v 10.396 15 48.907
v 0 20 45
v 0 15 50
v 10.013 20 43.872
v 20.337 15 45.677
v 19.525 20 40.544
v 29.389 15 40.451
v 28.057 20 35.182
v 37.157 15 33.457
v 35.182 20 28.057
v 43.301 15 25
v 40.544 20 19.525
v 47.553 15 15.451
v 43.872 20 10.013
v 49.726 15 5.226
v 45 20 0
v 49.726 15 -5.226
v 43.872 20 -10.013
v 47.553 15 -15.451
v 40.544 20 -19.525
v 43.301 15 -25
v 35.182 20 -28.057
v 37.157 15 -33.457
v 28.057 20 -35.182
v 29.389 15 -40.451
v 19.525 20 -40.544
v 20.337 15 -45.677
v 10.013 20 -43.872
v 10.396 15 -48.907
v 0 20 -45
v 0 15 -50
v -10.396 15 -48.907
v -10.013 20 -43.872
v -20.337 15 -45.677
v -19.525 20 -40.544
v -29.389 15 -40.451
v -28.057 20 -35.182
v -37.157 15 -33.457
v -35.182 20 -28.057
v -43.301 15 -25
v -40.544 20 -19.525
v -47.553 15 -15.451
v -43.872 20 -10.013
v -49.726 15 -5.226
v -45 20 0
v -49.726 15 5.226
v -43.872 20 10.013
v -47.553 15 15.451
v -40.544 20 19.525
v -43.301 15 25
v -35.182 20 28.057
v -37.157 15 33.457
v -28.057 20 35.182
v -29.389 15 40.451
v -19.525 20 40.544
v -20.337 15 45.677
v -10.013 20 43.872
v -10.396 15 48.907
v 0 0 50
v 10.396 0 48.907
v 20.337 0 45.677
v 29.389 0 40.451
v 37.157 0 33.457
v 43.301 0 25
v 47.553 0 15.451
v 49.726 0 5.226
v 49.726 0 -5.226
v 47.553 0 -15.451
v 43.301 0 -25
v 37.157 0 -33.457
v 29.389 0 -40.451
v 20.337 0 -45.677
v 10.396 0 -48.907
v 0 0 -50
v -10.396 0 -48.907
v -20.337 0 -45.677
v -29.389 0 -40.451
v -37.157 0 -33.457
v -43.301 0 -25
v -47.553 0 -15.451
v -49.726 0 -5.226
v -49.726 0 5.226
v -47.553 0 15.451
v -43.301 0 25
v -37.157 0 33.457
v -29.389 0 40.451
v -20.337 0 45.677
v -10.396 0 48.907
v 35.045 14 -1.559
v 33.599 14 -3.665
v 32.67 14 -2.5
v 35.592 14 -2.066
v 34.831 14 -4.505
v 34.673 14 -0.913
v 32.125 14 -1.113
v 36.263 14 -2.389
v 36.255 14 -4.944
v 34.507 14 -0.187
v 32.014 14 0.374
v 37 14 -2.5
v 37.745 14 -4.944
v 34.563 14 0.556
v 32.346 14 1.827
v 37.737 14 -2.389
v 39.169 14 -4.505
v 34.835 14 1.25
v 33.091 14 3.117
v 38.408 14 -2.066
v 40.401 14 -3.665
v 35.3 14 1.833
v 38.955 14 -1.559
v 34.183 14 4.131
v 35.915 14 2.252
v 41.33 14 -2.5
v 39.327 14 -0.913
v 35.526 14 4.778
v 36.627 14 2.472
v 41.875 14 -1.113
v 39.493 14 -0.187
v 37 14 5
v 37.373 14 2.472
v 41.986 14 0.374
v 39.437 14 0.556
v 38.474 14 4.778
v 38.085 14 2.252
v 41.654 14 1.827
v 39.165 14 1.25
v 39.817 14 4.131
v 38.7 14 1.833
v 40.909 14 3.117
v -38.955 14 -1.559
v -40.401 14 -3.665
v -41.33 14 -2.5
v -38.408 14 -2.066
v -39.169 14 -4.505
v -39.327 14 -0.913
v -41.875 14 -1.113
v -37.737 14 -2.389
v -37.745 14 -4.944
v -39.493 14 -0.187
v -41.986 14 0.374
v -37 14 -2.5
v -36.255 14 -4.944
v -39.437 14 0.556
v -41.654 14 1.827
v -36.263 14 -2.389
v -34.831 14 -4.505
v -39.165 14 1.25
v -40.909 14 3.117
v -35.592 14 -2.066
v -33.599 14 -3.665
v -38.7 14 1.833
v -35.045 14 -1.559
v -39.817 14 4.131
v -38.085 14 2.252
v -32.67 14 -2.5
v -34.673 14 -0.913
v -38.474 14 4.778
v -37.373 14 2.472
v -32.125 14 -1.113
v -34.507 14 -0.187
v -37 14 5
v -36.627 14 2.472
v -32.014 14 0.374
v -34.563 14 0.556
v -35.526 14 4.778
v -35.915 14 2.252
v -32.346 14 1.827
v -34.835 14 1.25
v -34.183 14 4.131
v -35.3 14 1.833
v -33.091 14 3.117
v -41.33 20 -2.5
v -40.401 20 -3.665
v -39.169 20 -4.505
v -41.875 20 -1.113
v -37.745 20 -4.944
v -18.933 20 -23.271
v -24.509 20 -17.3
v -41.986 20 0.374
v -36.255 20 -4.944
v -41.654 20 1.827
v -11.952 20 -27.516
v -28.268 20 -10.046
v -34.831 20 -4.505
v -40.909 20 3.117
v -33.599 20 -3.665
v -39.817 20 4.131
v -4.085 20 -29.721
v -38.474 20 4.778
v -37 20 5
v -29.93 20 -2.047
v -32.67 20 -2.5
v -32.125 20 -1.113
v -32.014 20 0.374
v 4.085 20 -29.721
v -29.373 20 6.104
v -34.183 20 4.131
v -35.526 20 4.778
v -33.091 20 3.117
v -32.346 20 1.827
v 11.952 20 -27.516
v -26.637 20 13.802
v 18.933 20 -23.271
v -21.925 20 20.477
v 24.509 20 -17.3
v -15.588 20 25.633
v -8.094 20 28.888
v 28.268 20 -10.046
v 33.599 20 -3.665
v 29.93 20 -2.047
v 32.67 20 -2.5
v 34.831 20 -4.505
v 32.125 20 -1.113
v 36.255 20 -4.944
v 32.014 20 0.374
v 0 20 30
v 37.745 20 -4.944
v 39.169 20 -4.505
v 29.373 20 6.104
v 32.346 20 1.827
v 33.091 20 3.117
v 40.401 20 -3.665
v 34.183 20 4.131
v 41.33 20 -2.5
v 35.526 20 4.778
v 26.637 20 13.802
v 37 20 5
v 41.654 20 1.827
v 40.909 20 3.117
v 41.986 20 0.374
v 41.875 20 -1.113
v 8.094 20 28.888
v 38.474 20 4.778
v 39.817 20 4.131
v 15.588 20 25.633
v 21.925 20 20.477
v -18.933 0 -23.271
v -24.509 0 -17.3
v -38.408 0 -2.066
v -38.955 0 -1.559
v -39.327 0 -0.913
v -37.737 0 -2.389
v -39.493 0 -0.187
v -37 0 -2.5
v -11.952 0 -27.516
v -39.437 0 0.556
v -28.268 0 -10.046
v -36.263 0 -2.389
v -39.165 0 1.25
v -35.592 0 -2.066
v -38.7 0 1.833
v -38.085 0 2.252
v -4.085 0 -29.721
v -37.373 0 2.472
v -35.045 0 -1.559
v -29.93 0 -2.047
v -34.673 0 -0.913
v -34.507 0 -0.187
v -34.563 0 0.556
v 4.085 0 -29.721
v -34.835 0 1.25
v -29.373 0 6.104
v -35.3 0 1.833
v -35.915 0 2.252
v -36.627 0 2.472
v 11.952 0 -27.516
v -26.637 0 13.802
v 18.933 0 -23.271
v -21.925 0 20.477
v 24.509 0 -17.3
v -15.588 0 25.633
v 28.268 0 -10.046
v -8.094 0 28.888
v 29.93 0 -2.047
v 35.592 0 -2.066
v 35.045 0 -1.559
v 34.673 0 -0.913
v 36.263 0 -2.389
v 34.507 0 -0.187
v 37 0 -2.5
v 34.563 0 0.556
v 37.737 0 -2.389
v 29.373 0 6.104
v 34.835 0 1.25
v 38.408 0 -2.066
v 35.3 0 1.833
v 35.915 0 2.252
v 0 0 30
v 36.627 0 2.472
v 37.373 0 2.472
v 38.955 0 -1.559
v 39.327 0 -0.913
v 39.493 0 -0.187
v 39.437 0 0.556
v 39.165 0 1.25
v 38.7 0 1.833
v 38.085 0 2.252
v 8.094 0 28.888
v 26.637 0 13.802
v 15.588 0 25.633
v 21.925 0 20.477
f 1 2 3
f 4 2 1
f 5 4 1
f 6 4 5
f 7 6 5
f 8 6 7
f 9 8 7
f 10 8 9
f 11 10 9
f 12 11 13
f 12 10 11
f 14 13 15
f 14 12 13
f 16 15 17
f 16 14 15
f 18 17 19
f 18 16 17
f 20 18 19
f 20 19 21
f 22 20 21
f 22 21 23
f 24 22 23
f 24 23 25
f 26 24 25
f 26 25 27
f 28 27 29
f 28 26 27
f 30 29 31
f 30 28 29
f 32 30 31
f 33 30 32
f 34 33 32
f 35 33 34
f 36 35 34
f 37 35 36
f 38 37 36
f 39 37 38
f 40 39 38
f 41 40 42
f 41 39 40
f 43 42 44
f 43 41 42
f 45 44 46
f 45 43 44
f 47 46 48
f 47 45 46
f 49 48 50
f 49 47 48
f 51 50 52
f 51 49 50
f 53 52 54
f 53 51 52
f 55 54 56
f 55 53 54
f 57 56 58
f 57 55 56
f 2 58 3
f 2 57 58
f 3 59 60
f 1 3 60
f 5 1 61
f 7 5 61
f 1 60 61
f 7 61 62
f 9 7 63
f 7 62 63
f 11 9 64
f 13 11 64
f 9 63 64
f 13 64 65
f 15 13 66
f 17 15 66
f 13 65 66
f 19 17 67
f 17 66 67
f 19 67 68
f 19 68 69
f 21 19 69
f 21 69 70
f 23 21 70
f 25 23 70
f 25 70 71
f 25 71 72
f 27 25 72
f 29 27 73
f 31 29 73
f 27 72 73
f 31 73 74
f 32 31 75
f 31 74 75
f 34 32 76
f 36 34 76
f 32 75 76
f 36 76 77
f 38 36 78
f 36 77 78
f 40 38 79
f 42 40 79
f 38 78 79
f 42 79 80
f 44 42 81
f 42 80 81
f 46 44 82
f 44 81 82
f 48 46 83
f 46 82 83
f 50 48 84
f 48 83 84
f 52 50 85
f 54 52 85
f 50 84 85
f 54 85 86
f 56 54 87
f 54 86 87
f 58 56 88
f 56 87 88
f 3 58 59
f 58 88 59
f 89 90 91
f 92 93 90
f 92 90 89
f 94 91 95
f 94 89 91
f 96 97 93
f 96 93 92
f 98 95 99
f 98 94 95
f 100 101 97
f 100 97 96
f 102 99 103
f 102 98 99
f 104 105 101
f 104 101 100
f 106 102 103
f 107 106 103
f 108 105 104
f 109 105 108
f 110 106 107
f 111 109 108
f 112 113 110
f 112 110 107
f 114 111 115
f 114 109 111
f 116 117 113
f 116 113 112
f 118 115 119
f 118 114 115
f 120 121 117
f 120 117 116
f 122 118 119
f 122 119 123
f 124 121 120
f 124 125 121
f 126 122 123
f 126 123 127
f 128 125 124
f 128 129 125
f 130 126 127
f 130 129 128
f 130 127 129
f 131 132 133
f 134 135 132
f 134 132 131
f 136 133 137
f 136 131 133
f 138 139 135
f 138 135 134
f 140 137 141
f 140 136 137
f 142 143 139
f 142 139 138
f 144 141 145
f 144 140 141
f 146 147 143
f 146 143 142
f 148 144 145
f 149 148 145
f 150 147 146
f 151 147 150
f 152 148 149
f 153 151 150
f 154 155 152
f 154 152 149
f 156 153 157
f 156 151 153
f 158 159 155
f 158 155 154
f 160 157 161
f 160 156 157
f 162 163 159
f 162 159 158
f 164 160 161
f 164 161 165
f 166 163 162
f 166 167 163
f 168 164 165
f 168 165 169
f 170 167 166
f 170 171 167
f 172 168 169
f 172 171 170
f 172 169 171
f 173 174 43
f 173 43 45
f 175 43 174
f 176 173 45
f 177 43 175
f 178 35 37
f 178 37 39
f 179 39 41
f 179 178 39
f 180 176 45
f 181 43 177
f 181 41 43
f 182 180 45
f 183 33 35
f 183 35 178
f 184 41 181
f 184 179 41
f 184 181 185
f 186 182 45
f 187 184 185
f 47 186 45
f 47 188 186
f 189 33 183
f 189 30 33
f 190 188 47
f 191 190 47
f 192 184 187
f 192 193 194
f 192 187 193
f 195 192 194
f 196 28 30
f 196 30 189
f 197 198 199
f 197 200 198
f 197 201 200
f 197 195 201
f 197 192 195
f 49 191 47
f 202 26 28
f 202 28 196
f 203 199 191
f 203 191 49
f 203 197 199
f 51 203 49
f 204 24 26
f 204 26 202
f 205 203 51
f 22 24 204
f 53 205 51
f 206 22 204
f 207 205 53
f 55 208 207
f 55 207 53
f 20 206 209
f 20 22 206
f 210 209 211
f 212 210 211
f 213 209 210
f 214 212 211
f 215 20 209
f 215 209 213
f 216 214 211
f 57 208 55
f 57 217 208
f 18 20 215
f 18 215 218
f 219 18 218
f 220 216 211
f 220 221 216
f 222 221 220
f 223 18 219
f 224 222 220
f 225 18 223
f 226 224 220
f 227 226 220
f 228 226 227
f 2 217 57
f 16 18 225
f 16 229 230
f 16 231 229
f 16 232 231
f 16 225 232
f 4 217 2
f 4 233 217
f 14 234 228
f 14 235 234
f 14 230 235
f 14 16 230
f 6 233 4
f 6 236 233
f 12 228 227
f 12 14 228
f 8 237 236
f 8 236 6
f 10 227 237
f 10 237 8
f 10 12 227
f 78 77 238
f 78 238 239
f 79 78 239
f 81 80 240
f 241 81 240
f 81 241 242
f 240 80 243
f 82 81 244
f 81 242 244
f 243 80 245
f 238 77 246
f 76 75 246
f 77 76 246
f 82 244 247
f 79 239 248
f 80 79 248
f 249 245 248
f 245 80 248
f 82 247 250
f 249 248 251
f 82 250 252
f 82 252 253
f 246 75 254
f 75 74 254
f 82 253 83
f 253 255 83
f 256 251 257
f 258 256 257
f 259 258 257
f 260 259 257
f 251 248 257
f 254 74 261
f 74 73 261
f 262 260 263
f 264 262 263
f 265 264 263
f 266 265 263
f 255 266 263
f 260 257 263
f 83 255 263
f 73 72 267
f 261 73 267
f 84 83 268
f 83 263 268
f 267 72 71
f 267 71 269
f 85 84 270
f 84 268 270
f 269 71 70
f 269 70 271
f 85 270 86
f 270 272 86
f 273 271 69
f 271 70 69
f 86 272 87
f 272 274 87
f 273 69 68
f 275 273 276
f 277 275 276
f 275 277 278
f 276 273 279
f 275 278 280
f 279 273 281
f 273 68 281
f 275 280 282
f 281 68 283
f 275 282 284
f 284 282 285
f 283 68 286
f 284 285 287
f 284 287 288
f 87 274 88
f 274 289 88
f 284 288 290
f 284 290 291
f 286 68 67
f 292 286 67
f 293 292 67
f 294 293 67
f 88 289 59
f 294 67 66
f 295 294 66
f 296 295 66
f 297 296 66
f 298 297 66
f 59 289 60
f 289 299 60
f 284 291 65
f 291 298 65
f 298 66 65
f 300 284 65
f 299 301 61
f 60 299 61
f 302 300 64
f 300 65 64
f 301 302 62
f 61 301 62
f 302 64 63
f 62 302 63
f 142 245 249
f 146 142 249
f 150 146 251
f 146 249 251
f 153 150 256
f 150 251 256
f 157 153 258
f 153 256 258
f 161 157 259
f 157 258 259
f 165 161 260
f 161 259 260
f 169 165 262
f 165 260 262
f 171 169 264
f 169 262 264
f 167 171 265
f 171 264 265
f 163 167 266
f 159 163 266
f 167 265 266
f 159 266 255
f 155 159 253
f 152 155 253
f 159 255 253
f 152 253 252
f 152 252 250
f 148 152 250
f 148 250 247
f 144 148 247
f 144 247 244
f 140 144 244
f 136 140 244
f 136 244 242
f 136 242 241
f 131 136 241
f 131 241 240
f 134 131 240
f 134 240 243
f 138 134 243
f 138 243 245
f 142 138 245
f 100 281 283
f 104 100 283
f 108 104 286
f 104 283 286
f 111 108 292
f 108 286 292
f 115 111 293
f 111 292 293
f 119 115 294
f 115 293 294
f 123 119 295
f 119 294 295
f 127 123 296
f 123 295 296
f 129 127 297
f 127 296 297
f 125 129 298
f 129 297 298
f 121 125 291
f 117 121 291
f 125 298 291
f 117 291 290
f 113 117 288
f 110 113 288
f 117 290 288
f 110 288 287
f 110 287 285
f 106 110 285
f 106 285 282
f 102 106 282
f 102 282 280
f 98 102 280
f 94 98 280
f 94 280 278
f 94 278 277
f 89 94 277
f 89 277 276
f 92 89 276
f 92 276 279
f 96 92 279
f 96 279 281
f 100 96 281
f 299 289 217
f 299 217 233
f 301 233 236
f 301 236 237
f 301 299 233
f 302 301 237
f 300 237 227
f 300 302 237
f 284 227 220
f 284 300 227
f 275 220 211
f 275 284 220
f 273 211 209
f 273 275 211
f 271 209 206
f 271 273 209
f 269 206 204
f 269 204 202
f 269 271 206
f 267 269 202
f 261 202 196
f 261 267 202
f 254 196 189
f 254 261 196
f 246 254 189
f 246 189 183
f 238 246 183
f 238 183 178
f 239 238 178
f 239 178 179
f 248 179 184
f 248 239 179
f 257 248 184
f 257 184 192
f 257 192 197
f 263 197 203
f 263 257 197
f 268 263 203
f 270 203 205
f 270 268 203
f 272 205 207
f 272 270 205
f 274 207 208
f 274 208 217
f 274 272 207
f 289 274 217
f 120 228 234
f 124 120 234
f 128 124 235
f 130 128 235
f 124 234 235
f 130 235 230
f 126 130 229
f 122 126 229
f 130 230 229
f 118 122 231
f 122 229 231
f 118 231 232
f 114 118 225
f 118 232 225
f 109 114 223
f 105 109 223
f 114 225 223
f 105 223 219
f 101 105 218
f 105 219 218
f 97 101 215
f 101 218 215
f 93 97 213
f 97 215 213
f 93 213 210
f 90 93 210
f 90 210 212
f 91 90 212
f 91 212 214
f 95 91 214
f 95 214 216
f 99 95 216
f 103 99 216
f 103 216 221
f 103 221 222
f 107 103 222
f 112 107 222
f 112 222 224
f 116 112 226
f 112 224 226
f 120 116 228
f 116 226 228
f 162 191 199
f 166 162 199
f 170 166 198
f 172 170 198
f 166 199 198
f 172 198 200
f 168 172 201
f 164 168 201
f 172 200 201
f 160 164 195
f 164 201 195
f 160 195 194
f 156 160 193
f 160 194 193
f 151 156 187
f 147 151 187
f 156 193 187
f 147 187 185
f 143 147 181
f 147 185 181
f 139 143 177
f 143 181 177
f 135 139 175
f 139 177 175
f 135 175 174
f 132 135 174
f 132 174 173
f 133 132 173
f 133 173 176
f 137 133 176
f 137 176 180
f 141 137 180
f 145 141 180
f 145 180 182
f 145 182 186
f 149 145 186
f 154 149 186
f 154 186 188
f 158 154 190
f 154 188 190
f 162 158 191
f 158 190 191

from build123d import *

# Parameters (mm, degrees)
SKETCH1_R                 = 50
SKETCH1_R_2               = 30
BOSS_EXTRUDE1_DEPTH       = 20
CHAMFER1_SIZE             = 5
M6X1_0_TAPPED_HOLE1_D     = 5
M6X1_0_TAPPED_HOLE1_DEPTH = 50
M6X1_0_TAPPED_HOLE1_TIP   = 1.502151548
SKETCH4_R                 = 5
CUT_EXTRUDE1_DEPTH        = 6


with BuildPart() as part:
    # Sketch1 → Boss-Extrude1 (new body)
    with BuildSketch(Plane(origin=(0, 0, 0), x_dir=(1, 0, 0), z_dir=(0, 1, 0))):
        with Locations(Location((0, 0, 0), (0, 0, 270))):
            Circle(SKETCH1_R)
        with Locations(Location((0, 0, 0), (0, 0, 270))):
            Circle(SKETCH1_R_2, mode=Mode.SUBTRACT)
    extrude(amount=BOSS_EXTRUDE1_DEPTH)

    # Chamfer1
    chamfer1_edges = [part.edges().sort_by_distance(p)[0] for p in [
        (0, 20, -50),
    ]]
    chamfer(chamfer1_edges, length=CHAMFER1_SIZE)

    # M6x1.0 Tapped Hole1
    with Locations(Plane(origin=(-37, 20, 0), x_dir=(0, 0, 1), z_dir=(0, 1, 0))):
        with Locations((0, 0), (0, 74)):
            Hole(M6X1_0_TAPPED_HOLE1_D / 2, depth=M6X1_0_TAPPED_HOLE1_DEPTH)
            with Locations((0, 0, -(M6X1_0_TAPPED_HOLE1_DEPTH + M6X1_0_TAPPED_HOLE1_TIP / 2))):  # 118° drill point
                Cone(0, M6X1_0_TAPPED_HOLE1_D / 2, M6X1_0_TAPPED_HOLE1_TIP, mode=Mode.SUBTRACT)

    # Sketch4 → Cut-Extrude1 (cut)
    with BuildSketch(Plane(origin=(0, 20, 0), x_dir=(1, 0, 0), z_dir=(0, 1, 0))):
        with Locations(Location((-37, 0, 0), (0, 0, 270))):
            Circle(SKETCH4_R)
        with Locations(Location((37, 0, 0), (0, 0, 270))):
            Circle(SKETCH4_R)
    extrude(amount=-CUT_EXTRUDE1_DEPTH, mode=Mode.SUBTRACT)


solid = part.part
